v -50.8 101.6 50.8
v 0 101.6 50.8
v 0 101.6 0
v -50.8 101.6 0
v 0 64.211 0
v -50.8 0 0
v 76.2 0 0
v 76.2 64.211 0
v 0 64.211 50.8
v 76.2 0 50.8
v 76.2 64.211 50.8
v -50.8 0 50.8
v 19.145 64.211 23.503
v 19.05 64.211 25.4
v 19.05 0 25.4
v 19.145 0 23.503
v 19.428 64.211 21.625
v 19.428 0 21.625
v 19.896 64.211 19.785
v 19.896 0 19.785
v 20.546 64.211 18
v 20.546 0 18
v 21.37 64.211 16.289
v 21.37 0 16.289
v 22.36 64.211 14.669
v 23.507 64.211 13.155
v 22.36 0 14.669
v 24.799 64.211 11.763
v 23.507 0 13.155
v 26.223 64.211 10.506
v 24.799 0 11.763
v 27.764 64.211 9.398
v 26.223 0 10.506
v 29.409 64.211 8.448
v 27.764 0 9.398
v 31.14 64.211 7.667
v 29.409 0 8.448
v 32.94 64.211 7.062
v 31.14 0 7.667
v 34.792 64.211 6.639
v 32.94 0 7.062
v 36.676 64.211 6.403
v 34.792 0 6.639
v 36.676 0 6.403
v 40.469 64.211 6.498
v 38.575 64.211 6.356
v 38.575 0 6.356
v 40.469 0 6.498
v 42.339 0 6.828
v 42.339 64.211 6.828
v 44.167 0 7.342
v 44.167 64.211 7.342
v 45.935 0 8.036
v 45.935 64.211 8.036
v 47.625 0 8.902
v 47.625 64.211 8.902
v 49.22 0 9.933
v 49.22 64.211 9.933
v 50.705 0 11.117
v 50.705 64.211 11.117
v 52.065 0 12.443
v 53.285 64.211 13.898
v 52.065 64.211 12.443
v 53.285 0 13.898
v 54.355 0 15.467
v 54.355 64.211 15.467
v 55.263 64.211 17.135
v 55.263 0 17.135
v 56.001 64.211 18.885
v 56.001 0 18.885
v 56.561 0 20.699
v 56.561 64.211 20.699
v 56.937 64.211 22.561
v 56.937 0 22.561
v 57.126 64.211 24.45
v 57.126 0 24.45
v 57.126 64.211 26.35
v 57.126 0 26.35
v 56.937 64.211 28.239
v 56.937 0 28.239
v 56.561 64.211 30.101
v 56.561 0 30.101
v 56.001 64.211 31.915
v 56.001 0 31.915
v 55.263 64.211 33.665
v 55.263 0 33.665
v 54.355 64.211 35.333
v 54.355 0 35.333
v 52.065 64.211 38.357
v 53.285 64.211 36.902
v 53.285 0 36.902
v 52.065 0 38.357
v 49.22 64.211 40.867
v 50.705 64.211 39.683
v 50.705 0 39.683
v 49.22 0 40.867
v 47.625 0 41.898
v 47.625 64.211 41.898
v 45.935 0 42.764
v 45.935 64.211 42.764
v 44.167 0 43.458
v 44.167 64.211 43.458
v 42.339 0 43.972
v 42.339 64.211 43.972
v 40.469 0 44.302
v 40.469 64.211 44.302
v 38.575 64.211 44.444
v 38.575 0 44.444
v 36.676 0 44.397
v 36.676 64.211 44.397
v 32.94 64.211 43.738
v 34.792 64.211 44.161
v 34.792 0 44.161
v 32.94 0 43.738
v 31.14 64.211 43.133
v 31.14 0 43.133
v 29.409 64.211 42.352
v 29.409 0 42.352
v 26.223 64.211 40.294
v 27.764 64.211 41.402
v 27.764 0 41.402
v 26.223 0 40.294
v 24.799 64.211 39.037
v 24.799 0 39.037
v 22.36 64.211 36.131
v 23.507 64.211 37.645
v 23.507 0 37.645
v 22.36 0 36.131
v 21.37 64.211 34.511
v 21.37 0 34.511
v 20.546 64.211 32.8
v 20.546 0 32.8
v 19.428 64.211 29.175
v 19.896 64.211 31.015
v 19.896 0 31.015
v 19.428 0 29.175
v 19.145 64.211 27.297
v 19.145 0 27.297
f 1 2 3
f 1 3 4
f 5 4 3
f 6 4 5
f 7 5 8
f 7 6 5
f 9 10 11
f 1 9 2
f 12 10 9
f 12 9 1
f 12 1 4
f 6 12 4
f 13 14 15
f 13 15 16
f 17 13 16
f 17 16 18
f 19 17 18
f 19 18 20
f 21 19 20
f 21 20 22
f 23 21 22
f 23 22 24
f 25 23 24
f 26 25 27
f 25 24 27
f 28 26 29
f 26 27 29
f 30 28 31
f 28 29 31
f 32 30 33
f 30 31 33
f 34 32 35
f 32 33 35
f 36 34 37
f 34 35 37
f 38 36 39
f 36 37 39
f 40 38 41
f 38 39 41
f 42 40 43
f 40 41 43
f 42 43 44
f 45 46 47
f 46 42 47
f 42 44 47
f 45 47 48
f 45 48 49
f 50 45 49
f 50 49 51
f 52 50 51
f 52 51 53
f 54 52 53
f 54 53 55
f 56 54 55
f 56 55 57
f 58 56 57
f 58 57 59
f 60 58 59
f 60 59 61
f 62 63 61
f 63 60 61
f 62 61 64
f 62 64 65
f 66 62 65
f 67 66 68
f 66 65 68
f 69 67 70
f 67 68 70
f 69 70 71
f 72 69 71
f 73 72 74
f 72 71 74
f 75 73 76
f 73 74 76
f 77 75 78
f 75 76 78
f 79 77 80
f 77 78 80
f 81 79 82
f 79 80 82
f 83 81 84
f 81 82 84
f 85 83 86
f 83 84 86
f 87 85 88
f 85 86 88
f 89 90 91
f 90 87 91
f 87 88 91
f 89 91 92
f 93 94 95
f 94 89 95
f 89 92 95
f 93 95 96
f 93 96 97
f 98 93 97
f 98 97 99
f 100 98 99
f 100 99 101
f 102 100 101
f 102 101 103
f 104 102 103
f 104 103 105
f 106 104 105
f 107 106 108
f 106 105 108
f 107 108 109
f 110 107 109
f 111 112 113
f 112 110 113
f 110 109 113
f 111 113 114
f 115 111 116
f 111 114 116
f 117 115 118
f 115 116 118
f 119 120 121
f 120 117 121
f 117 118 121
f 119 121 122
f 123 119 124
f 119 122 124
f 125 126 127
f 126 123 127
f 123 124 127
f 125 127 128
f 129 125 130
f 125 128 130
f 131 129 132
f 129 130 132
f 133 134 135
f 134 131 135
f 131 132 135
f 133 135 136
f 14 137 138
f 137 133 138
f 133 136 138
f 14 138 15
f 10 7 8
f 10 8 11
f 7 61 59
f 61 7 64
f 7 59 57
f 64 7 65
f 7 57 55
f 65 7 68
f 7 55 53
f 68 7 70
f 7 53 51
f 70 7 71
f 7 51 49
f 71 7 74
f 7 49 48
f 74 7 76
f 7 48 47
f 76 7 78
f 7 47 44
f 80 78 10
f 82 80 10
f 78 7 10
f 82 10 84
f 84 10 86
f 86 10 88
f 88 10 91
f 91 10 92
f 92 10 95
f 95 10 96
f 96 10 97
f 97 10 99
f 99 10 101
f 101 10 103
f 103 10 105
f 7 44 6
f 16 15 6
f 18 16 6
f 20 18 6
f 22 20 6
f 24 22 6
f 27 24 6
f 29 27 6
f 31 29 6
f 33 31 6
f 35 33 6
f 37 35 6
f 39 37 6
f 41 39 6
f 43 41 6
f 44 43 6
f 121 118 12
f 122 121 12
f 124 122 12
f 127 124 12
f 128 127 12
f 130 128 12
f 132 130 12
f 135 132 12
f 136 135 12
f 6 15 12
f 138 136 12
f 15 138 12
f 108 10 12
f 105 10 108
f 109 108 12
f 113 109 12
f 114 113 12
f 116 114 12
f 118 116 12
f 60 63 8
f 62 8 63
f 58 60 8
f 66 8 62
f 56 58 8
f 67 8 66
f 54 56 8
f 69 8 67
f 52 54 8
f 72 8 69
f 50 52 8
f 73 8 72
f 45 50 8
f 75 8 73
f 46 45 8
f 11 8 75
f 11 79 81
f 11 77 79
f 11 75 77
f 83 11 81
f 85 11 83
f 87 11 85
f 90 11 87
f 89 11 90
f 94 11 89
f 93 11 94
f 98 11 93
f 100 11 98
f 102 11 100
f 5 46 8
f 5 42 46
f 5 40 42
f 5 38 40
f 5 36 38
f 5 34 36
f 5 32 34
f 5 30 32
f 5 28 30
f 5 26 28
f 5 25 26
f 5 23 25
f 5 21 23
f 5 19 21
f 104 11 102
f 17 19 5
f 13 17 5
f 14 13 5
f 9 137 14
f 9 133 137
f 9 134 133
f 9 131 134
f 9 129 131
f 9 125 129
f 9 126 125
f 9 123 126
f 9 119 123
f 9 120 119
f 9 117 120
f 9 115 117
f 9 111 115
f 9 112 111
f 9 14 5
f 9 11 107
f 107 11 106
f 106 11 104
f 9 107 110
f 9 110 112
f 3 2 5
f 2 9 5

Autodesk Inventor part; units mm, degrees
ref_plane "YZ Plane" through (0, 0, 0) normal (1, 0, 0) x (0, 1, 0)
ref_plane "XZ Plane" through (0, 0, 0) normal (0, 1, 0) x (-1, 0, 0)
ref_plane "XY Plane" through (0, 0, 0) normal (0, 0, 1) x (1, 0, 0)
sketch "Sketch1" plane through (0, 0, 0) normal (0, 1, 0) x (-1, 0, 0)
  line L0 (0, 0) -> (-76.2, 0)
  line L1 (-76.2, 0) -> (-76.2, 50.8)
  line L2 (-76.2, 50.8) -> (0, 50.8)
  line L3 (0, 50.8) -> (0, 0)
  line L4 (0, 50.8) -> (50.8, 50.8)
  line L5 (50.8, 50.8) -> (50.8, 0)
  line L6 (50.8, 0) -> (0, 0)
  line L7 (0, 0) -> (0, 50.8)
  circle A0 centre (-38.1, 25.4) radius 19.05
  circle A1 centre (25.4, 37.0829) radius 6.964
  line L8 (50.8, 25.4) -> (-76.2, 25.4)
  point P0 (-57.15, 25.4)
  point P1 (-19.05, 25.4)
  point P2 (0, 25.4)
  dimension "d0" = 76.2
  dimension "d1" = 50.8
  dimension "d2" = 50.8
  dimension "d3" = 38.1
extrude "Extrusion3" add sketch "Sketch1" along normal blind 64.2112 contours L8 A0 L1 L2 L3
extrude "Extrusion4" add sketch "Sketch1" along normal blind 101.6 contours L3 L4 L5 L8 | A1
mirror "Mirror1" about plane through (76.2, 0, 25.4) normal (0, 0, -1)
properties part number "Cylinder Block"
